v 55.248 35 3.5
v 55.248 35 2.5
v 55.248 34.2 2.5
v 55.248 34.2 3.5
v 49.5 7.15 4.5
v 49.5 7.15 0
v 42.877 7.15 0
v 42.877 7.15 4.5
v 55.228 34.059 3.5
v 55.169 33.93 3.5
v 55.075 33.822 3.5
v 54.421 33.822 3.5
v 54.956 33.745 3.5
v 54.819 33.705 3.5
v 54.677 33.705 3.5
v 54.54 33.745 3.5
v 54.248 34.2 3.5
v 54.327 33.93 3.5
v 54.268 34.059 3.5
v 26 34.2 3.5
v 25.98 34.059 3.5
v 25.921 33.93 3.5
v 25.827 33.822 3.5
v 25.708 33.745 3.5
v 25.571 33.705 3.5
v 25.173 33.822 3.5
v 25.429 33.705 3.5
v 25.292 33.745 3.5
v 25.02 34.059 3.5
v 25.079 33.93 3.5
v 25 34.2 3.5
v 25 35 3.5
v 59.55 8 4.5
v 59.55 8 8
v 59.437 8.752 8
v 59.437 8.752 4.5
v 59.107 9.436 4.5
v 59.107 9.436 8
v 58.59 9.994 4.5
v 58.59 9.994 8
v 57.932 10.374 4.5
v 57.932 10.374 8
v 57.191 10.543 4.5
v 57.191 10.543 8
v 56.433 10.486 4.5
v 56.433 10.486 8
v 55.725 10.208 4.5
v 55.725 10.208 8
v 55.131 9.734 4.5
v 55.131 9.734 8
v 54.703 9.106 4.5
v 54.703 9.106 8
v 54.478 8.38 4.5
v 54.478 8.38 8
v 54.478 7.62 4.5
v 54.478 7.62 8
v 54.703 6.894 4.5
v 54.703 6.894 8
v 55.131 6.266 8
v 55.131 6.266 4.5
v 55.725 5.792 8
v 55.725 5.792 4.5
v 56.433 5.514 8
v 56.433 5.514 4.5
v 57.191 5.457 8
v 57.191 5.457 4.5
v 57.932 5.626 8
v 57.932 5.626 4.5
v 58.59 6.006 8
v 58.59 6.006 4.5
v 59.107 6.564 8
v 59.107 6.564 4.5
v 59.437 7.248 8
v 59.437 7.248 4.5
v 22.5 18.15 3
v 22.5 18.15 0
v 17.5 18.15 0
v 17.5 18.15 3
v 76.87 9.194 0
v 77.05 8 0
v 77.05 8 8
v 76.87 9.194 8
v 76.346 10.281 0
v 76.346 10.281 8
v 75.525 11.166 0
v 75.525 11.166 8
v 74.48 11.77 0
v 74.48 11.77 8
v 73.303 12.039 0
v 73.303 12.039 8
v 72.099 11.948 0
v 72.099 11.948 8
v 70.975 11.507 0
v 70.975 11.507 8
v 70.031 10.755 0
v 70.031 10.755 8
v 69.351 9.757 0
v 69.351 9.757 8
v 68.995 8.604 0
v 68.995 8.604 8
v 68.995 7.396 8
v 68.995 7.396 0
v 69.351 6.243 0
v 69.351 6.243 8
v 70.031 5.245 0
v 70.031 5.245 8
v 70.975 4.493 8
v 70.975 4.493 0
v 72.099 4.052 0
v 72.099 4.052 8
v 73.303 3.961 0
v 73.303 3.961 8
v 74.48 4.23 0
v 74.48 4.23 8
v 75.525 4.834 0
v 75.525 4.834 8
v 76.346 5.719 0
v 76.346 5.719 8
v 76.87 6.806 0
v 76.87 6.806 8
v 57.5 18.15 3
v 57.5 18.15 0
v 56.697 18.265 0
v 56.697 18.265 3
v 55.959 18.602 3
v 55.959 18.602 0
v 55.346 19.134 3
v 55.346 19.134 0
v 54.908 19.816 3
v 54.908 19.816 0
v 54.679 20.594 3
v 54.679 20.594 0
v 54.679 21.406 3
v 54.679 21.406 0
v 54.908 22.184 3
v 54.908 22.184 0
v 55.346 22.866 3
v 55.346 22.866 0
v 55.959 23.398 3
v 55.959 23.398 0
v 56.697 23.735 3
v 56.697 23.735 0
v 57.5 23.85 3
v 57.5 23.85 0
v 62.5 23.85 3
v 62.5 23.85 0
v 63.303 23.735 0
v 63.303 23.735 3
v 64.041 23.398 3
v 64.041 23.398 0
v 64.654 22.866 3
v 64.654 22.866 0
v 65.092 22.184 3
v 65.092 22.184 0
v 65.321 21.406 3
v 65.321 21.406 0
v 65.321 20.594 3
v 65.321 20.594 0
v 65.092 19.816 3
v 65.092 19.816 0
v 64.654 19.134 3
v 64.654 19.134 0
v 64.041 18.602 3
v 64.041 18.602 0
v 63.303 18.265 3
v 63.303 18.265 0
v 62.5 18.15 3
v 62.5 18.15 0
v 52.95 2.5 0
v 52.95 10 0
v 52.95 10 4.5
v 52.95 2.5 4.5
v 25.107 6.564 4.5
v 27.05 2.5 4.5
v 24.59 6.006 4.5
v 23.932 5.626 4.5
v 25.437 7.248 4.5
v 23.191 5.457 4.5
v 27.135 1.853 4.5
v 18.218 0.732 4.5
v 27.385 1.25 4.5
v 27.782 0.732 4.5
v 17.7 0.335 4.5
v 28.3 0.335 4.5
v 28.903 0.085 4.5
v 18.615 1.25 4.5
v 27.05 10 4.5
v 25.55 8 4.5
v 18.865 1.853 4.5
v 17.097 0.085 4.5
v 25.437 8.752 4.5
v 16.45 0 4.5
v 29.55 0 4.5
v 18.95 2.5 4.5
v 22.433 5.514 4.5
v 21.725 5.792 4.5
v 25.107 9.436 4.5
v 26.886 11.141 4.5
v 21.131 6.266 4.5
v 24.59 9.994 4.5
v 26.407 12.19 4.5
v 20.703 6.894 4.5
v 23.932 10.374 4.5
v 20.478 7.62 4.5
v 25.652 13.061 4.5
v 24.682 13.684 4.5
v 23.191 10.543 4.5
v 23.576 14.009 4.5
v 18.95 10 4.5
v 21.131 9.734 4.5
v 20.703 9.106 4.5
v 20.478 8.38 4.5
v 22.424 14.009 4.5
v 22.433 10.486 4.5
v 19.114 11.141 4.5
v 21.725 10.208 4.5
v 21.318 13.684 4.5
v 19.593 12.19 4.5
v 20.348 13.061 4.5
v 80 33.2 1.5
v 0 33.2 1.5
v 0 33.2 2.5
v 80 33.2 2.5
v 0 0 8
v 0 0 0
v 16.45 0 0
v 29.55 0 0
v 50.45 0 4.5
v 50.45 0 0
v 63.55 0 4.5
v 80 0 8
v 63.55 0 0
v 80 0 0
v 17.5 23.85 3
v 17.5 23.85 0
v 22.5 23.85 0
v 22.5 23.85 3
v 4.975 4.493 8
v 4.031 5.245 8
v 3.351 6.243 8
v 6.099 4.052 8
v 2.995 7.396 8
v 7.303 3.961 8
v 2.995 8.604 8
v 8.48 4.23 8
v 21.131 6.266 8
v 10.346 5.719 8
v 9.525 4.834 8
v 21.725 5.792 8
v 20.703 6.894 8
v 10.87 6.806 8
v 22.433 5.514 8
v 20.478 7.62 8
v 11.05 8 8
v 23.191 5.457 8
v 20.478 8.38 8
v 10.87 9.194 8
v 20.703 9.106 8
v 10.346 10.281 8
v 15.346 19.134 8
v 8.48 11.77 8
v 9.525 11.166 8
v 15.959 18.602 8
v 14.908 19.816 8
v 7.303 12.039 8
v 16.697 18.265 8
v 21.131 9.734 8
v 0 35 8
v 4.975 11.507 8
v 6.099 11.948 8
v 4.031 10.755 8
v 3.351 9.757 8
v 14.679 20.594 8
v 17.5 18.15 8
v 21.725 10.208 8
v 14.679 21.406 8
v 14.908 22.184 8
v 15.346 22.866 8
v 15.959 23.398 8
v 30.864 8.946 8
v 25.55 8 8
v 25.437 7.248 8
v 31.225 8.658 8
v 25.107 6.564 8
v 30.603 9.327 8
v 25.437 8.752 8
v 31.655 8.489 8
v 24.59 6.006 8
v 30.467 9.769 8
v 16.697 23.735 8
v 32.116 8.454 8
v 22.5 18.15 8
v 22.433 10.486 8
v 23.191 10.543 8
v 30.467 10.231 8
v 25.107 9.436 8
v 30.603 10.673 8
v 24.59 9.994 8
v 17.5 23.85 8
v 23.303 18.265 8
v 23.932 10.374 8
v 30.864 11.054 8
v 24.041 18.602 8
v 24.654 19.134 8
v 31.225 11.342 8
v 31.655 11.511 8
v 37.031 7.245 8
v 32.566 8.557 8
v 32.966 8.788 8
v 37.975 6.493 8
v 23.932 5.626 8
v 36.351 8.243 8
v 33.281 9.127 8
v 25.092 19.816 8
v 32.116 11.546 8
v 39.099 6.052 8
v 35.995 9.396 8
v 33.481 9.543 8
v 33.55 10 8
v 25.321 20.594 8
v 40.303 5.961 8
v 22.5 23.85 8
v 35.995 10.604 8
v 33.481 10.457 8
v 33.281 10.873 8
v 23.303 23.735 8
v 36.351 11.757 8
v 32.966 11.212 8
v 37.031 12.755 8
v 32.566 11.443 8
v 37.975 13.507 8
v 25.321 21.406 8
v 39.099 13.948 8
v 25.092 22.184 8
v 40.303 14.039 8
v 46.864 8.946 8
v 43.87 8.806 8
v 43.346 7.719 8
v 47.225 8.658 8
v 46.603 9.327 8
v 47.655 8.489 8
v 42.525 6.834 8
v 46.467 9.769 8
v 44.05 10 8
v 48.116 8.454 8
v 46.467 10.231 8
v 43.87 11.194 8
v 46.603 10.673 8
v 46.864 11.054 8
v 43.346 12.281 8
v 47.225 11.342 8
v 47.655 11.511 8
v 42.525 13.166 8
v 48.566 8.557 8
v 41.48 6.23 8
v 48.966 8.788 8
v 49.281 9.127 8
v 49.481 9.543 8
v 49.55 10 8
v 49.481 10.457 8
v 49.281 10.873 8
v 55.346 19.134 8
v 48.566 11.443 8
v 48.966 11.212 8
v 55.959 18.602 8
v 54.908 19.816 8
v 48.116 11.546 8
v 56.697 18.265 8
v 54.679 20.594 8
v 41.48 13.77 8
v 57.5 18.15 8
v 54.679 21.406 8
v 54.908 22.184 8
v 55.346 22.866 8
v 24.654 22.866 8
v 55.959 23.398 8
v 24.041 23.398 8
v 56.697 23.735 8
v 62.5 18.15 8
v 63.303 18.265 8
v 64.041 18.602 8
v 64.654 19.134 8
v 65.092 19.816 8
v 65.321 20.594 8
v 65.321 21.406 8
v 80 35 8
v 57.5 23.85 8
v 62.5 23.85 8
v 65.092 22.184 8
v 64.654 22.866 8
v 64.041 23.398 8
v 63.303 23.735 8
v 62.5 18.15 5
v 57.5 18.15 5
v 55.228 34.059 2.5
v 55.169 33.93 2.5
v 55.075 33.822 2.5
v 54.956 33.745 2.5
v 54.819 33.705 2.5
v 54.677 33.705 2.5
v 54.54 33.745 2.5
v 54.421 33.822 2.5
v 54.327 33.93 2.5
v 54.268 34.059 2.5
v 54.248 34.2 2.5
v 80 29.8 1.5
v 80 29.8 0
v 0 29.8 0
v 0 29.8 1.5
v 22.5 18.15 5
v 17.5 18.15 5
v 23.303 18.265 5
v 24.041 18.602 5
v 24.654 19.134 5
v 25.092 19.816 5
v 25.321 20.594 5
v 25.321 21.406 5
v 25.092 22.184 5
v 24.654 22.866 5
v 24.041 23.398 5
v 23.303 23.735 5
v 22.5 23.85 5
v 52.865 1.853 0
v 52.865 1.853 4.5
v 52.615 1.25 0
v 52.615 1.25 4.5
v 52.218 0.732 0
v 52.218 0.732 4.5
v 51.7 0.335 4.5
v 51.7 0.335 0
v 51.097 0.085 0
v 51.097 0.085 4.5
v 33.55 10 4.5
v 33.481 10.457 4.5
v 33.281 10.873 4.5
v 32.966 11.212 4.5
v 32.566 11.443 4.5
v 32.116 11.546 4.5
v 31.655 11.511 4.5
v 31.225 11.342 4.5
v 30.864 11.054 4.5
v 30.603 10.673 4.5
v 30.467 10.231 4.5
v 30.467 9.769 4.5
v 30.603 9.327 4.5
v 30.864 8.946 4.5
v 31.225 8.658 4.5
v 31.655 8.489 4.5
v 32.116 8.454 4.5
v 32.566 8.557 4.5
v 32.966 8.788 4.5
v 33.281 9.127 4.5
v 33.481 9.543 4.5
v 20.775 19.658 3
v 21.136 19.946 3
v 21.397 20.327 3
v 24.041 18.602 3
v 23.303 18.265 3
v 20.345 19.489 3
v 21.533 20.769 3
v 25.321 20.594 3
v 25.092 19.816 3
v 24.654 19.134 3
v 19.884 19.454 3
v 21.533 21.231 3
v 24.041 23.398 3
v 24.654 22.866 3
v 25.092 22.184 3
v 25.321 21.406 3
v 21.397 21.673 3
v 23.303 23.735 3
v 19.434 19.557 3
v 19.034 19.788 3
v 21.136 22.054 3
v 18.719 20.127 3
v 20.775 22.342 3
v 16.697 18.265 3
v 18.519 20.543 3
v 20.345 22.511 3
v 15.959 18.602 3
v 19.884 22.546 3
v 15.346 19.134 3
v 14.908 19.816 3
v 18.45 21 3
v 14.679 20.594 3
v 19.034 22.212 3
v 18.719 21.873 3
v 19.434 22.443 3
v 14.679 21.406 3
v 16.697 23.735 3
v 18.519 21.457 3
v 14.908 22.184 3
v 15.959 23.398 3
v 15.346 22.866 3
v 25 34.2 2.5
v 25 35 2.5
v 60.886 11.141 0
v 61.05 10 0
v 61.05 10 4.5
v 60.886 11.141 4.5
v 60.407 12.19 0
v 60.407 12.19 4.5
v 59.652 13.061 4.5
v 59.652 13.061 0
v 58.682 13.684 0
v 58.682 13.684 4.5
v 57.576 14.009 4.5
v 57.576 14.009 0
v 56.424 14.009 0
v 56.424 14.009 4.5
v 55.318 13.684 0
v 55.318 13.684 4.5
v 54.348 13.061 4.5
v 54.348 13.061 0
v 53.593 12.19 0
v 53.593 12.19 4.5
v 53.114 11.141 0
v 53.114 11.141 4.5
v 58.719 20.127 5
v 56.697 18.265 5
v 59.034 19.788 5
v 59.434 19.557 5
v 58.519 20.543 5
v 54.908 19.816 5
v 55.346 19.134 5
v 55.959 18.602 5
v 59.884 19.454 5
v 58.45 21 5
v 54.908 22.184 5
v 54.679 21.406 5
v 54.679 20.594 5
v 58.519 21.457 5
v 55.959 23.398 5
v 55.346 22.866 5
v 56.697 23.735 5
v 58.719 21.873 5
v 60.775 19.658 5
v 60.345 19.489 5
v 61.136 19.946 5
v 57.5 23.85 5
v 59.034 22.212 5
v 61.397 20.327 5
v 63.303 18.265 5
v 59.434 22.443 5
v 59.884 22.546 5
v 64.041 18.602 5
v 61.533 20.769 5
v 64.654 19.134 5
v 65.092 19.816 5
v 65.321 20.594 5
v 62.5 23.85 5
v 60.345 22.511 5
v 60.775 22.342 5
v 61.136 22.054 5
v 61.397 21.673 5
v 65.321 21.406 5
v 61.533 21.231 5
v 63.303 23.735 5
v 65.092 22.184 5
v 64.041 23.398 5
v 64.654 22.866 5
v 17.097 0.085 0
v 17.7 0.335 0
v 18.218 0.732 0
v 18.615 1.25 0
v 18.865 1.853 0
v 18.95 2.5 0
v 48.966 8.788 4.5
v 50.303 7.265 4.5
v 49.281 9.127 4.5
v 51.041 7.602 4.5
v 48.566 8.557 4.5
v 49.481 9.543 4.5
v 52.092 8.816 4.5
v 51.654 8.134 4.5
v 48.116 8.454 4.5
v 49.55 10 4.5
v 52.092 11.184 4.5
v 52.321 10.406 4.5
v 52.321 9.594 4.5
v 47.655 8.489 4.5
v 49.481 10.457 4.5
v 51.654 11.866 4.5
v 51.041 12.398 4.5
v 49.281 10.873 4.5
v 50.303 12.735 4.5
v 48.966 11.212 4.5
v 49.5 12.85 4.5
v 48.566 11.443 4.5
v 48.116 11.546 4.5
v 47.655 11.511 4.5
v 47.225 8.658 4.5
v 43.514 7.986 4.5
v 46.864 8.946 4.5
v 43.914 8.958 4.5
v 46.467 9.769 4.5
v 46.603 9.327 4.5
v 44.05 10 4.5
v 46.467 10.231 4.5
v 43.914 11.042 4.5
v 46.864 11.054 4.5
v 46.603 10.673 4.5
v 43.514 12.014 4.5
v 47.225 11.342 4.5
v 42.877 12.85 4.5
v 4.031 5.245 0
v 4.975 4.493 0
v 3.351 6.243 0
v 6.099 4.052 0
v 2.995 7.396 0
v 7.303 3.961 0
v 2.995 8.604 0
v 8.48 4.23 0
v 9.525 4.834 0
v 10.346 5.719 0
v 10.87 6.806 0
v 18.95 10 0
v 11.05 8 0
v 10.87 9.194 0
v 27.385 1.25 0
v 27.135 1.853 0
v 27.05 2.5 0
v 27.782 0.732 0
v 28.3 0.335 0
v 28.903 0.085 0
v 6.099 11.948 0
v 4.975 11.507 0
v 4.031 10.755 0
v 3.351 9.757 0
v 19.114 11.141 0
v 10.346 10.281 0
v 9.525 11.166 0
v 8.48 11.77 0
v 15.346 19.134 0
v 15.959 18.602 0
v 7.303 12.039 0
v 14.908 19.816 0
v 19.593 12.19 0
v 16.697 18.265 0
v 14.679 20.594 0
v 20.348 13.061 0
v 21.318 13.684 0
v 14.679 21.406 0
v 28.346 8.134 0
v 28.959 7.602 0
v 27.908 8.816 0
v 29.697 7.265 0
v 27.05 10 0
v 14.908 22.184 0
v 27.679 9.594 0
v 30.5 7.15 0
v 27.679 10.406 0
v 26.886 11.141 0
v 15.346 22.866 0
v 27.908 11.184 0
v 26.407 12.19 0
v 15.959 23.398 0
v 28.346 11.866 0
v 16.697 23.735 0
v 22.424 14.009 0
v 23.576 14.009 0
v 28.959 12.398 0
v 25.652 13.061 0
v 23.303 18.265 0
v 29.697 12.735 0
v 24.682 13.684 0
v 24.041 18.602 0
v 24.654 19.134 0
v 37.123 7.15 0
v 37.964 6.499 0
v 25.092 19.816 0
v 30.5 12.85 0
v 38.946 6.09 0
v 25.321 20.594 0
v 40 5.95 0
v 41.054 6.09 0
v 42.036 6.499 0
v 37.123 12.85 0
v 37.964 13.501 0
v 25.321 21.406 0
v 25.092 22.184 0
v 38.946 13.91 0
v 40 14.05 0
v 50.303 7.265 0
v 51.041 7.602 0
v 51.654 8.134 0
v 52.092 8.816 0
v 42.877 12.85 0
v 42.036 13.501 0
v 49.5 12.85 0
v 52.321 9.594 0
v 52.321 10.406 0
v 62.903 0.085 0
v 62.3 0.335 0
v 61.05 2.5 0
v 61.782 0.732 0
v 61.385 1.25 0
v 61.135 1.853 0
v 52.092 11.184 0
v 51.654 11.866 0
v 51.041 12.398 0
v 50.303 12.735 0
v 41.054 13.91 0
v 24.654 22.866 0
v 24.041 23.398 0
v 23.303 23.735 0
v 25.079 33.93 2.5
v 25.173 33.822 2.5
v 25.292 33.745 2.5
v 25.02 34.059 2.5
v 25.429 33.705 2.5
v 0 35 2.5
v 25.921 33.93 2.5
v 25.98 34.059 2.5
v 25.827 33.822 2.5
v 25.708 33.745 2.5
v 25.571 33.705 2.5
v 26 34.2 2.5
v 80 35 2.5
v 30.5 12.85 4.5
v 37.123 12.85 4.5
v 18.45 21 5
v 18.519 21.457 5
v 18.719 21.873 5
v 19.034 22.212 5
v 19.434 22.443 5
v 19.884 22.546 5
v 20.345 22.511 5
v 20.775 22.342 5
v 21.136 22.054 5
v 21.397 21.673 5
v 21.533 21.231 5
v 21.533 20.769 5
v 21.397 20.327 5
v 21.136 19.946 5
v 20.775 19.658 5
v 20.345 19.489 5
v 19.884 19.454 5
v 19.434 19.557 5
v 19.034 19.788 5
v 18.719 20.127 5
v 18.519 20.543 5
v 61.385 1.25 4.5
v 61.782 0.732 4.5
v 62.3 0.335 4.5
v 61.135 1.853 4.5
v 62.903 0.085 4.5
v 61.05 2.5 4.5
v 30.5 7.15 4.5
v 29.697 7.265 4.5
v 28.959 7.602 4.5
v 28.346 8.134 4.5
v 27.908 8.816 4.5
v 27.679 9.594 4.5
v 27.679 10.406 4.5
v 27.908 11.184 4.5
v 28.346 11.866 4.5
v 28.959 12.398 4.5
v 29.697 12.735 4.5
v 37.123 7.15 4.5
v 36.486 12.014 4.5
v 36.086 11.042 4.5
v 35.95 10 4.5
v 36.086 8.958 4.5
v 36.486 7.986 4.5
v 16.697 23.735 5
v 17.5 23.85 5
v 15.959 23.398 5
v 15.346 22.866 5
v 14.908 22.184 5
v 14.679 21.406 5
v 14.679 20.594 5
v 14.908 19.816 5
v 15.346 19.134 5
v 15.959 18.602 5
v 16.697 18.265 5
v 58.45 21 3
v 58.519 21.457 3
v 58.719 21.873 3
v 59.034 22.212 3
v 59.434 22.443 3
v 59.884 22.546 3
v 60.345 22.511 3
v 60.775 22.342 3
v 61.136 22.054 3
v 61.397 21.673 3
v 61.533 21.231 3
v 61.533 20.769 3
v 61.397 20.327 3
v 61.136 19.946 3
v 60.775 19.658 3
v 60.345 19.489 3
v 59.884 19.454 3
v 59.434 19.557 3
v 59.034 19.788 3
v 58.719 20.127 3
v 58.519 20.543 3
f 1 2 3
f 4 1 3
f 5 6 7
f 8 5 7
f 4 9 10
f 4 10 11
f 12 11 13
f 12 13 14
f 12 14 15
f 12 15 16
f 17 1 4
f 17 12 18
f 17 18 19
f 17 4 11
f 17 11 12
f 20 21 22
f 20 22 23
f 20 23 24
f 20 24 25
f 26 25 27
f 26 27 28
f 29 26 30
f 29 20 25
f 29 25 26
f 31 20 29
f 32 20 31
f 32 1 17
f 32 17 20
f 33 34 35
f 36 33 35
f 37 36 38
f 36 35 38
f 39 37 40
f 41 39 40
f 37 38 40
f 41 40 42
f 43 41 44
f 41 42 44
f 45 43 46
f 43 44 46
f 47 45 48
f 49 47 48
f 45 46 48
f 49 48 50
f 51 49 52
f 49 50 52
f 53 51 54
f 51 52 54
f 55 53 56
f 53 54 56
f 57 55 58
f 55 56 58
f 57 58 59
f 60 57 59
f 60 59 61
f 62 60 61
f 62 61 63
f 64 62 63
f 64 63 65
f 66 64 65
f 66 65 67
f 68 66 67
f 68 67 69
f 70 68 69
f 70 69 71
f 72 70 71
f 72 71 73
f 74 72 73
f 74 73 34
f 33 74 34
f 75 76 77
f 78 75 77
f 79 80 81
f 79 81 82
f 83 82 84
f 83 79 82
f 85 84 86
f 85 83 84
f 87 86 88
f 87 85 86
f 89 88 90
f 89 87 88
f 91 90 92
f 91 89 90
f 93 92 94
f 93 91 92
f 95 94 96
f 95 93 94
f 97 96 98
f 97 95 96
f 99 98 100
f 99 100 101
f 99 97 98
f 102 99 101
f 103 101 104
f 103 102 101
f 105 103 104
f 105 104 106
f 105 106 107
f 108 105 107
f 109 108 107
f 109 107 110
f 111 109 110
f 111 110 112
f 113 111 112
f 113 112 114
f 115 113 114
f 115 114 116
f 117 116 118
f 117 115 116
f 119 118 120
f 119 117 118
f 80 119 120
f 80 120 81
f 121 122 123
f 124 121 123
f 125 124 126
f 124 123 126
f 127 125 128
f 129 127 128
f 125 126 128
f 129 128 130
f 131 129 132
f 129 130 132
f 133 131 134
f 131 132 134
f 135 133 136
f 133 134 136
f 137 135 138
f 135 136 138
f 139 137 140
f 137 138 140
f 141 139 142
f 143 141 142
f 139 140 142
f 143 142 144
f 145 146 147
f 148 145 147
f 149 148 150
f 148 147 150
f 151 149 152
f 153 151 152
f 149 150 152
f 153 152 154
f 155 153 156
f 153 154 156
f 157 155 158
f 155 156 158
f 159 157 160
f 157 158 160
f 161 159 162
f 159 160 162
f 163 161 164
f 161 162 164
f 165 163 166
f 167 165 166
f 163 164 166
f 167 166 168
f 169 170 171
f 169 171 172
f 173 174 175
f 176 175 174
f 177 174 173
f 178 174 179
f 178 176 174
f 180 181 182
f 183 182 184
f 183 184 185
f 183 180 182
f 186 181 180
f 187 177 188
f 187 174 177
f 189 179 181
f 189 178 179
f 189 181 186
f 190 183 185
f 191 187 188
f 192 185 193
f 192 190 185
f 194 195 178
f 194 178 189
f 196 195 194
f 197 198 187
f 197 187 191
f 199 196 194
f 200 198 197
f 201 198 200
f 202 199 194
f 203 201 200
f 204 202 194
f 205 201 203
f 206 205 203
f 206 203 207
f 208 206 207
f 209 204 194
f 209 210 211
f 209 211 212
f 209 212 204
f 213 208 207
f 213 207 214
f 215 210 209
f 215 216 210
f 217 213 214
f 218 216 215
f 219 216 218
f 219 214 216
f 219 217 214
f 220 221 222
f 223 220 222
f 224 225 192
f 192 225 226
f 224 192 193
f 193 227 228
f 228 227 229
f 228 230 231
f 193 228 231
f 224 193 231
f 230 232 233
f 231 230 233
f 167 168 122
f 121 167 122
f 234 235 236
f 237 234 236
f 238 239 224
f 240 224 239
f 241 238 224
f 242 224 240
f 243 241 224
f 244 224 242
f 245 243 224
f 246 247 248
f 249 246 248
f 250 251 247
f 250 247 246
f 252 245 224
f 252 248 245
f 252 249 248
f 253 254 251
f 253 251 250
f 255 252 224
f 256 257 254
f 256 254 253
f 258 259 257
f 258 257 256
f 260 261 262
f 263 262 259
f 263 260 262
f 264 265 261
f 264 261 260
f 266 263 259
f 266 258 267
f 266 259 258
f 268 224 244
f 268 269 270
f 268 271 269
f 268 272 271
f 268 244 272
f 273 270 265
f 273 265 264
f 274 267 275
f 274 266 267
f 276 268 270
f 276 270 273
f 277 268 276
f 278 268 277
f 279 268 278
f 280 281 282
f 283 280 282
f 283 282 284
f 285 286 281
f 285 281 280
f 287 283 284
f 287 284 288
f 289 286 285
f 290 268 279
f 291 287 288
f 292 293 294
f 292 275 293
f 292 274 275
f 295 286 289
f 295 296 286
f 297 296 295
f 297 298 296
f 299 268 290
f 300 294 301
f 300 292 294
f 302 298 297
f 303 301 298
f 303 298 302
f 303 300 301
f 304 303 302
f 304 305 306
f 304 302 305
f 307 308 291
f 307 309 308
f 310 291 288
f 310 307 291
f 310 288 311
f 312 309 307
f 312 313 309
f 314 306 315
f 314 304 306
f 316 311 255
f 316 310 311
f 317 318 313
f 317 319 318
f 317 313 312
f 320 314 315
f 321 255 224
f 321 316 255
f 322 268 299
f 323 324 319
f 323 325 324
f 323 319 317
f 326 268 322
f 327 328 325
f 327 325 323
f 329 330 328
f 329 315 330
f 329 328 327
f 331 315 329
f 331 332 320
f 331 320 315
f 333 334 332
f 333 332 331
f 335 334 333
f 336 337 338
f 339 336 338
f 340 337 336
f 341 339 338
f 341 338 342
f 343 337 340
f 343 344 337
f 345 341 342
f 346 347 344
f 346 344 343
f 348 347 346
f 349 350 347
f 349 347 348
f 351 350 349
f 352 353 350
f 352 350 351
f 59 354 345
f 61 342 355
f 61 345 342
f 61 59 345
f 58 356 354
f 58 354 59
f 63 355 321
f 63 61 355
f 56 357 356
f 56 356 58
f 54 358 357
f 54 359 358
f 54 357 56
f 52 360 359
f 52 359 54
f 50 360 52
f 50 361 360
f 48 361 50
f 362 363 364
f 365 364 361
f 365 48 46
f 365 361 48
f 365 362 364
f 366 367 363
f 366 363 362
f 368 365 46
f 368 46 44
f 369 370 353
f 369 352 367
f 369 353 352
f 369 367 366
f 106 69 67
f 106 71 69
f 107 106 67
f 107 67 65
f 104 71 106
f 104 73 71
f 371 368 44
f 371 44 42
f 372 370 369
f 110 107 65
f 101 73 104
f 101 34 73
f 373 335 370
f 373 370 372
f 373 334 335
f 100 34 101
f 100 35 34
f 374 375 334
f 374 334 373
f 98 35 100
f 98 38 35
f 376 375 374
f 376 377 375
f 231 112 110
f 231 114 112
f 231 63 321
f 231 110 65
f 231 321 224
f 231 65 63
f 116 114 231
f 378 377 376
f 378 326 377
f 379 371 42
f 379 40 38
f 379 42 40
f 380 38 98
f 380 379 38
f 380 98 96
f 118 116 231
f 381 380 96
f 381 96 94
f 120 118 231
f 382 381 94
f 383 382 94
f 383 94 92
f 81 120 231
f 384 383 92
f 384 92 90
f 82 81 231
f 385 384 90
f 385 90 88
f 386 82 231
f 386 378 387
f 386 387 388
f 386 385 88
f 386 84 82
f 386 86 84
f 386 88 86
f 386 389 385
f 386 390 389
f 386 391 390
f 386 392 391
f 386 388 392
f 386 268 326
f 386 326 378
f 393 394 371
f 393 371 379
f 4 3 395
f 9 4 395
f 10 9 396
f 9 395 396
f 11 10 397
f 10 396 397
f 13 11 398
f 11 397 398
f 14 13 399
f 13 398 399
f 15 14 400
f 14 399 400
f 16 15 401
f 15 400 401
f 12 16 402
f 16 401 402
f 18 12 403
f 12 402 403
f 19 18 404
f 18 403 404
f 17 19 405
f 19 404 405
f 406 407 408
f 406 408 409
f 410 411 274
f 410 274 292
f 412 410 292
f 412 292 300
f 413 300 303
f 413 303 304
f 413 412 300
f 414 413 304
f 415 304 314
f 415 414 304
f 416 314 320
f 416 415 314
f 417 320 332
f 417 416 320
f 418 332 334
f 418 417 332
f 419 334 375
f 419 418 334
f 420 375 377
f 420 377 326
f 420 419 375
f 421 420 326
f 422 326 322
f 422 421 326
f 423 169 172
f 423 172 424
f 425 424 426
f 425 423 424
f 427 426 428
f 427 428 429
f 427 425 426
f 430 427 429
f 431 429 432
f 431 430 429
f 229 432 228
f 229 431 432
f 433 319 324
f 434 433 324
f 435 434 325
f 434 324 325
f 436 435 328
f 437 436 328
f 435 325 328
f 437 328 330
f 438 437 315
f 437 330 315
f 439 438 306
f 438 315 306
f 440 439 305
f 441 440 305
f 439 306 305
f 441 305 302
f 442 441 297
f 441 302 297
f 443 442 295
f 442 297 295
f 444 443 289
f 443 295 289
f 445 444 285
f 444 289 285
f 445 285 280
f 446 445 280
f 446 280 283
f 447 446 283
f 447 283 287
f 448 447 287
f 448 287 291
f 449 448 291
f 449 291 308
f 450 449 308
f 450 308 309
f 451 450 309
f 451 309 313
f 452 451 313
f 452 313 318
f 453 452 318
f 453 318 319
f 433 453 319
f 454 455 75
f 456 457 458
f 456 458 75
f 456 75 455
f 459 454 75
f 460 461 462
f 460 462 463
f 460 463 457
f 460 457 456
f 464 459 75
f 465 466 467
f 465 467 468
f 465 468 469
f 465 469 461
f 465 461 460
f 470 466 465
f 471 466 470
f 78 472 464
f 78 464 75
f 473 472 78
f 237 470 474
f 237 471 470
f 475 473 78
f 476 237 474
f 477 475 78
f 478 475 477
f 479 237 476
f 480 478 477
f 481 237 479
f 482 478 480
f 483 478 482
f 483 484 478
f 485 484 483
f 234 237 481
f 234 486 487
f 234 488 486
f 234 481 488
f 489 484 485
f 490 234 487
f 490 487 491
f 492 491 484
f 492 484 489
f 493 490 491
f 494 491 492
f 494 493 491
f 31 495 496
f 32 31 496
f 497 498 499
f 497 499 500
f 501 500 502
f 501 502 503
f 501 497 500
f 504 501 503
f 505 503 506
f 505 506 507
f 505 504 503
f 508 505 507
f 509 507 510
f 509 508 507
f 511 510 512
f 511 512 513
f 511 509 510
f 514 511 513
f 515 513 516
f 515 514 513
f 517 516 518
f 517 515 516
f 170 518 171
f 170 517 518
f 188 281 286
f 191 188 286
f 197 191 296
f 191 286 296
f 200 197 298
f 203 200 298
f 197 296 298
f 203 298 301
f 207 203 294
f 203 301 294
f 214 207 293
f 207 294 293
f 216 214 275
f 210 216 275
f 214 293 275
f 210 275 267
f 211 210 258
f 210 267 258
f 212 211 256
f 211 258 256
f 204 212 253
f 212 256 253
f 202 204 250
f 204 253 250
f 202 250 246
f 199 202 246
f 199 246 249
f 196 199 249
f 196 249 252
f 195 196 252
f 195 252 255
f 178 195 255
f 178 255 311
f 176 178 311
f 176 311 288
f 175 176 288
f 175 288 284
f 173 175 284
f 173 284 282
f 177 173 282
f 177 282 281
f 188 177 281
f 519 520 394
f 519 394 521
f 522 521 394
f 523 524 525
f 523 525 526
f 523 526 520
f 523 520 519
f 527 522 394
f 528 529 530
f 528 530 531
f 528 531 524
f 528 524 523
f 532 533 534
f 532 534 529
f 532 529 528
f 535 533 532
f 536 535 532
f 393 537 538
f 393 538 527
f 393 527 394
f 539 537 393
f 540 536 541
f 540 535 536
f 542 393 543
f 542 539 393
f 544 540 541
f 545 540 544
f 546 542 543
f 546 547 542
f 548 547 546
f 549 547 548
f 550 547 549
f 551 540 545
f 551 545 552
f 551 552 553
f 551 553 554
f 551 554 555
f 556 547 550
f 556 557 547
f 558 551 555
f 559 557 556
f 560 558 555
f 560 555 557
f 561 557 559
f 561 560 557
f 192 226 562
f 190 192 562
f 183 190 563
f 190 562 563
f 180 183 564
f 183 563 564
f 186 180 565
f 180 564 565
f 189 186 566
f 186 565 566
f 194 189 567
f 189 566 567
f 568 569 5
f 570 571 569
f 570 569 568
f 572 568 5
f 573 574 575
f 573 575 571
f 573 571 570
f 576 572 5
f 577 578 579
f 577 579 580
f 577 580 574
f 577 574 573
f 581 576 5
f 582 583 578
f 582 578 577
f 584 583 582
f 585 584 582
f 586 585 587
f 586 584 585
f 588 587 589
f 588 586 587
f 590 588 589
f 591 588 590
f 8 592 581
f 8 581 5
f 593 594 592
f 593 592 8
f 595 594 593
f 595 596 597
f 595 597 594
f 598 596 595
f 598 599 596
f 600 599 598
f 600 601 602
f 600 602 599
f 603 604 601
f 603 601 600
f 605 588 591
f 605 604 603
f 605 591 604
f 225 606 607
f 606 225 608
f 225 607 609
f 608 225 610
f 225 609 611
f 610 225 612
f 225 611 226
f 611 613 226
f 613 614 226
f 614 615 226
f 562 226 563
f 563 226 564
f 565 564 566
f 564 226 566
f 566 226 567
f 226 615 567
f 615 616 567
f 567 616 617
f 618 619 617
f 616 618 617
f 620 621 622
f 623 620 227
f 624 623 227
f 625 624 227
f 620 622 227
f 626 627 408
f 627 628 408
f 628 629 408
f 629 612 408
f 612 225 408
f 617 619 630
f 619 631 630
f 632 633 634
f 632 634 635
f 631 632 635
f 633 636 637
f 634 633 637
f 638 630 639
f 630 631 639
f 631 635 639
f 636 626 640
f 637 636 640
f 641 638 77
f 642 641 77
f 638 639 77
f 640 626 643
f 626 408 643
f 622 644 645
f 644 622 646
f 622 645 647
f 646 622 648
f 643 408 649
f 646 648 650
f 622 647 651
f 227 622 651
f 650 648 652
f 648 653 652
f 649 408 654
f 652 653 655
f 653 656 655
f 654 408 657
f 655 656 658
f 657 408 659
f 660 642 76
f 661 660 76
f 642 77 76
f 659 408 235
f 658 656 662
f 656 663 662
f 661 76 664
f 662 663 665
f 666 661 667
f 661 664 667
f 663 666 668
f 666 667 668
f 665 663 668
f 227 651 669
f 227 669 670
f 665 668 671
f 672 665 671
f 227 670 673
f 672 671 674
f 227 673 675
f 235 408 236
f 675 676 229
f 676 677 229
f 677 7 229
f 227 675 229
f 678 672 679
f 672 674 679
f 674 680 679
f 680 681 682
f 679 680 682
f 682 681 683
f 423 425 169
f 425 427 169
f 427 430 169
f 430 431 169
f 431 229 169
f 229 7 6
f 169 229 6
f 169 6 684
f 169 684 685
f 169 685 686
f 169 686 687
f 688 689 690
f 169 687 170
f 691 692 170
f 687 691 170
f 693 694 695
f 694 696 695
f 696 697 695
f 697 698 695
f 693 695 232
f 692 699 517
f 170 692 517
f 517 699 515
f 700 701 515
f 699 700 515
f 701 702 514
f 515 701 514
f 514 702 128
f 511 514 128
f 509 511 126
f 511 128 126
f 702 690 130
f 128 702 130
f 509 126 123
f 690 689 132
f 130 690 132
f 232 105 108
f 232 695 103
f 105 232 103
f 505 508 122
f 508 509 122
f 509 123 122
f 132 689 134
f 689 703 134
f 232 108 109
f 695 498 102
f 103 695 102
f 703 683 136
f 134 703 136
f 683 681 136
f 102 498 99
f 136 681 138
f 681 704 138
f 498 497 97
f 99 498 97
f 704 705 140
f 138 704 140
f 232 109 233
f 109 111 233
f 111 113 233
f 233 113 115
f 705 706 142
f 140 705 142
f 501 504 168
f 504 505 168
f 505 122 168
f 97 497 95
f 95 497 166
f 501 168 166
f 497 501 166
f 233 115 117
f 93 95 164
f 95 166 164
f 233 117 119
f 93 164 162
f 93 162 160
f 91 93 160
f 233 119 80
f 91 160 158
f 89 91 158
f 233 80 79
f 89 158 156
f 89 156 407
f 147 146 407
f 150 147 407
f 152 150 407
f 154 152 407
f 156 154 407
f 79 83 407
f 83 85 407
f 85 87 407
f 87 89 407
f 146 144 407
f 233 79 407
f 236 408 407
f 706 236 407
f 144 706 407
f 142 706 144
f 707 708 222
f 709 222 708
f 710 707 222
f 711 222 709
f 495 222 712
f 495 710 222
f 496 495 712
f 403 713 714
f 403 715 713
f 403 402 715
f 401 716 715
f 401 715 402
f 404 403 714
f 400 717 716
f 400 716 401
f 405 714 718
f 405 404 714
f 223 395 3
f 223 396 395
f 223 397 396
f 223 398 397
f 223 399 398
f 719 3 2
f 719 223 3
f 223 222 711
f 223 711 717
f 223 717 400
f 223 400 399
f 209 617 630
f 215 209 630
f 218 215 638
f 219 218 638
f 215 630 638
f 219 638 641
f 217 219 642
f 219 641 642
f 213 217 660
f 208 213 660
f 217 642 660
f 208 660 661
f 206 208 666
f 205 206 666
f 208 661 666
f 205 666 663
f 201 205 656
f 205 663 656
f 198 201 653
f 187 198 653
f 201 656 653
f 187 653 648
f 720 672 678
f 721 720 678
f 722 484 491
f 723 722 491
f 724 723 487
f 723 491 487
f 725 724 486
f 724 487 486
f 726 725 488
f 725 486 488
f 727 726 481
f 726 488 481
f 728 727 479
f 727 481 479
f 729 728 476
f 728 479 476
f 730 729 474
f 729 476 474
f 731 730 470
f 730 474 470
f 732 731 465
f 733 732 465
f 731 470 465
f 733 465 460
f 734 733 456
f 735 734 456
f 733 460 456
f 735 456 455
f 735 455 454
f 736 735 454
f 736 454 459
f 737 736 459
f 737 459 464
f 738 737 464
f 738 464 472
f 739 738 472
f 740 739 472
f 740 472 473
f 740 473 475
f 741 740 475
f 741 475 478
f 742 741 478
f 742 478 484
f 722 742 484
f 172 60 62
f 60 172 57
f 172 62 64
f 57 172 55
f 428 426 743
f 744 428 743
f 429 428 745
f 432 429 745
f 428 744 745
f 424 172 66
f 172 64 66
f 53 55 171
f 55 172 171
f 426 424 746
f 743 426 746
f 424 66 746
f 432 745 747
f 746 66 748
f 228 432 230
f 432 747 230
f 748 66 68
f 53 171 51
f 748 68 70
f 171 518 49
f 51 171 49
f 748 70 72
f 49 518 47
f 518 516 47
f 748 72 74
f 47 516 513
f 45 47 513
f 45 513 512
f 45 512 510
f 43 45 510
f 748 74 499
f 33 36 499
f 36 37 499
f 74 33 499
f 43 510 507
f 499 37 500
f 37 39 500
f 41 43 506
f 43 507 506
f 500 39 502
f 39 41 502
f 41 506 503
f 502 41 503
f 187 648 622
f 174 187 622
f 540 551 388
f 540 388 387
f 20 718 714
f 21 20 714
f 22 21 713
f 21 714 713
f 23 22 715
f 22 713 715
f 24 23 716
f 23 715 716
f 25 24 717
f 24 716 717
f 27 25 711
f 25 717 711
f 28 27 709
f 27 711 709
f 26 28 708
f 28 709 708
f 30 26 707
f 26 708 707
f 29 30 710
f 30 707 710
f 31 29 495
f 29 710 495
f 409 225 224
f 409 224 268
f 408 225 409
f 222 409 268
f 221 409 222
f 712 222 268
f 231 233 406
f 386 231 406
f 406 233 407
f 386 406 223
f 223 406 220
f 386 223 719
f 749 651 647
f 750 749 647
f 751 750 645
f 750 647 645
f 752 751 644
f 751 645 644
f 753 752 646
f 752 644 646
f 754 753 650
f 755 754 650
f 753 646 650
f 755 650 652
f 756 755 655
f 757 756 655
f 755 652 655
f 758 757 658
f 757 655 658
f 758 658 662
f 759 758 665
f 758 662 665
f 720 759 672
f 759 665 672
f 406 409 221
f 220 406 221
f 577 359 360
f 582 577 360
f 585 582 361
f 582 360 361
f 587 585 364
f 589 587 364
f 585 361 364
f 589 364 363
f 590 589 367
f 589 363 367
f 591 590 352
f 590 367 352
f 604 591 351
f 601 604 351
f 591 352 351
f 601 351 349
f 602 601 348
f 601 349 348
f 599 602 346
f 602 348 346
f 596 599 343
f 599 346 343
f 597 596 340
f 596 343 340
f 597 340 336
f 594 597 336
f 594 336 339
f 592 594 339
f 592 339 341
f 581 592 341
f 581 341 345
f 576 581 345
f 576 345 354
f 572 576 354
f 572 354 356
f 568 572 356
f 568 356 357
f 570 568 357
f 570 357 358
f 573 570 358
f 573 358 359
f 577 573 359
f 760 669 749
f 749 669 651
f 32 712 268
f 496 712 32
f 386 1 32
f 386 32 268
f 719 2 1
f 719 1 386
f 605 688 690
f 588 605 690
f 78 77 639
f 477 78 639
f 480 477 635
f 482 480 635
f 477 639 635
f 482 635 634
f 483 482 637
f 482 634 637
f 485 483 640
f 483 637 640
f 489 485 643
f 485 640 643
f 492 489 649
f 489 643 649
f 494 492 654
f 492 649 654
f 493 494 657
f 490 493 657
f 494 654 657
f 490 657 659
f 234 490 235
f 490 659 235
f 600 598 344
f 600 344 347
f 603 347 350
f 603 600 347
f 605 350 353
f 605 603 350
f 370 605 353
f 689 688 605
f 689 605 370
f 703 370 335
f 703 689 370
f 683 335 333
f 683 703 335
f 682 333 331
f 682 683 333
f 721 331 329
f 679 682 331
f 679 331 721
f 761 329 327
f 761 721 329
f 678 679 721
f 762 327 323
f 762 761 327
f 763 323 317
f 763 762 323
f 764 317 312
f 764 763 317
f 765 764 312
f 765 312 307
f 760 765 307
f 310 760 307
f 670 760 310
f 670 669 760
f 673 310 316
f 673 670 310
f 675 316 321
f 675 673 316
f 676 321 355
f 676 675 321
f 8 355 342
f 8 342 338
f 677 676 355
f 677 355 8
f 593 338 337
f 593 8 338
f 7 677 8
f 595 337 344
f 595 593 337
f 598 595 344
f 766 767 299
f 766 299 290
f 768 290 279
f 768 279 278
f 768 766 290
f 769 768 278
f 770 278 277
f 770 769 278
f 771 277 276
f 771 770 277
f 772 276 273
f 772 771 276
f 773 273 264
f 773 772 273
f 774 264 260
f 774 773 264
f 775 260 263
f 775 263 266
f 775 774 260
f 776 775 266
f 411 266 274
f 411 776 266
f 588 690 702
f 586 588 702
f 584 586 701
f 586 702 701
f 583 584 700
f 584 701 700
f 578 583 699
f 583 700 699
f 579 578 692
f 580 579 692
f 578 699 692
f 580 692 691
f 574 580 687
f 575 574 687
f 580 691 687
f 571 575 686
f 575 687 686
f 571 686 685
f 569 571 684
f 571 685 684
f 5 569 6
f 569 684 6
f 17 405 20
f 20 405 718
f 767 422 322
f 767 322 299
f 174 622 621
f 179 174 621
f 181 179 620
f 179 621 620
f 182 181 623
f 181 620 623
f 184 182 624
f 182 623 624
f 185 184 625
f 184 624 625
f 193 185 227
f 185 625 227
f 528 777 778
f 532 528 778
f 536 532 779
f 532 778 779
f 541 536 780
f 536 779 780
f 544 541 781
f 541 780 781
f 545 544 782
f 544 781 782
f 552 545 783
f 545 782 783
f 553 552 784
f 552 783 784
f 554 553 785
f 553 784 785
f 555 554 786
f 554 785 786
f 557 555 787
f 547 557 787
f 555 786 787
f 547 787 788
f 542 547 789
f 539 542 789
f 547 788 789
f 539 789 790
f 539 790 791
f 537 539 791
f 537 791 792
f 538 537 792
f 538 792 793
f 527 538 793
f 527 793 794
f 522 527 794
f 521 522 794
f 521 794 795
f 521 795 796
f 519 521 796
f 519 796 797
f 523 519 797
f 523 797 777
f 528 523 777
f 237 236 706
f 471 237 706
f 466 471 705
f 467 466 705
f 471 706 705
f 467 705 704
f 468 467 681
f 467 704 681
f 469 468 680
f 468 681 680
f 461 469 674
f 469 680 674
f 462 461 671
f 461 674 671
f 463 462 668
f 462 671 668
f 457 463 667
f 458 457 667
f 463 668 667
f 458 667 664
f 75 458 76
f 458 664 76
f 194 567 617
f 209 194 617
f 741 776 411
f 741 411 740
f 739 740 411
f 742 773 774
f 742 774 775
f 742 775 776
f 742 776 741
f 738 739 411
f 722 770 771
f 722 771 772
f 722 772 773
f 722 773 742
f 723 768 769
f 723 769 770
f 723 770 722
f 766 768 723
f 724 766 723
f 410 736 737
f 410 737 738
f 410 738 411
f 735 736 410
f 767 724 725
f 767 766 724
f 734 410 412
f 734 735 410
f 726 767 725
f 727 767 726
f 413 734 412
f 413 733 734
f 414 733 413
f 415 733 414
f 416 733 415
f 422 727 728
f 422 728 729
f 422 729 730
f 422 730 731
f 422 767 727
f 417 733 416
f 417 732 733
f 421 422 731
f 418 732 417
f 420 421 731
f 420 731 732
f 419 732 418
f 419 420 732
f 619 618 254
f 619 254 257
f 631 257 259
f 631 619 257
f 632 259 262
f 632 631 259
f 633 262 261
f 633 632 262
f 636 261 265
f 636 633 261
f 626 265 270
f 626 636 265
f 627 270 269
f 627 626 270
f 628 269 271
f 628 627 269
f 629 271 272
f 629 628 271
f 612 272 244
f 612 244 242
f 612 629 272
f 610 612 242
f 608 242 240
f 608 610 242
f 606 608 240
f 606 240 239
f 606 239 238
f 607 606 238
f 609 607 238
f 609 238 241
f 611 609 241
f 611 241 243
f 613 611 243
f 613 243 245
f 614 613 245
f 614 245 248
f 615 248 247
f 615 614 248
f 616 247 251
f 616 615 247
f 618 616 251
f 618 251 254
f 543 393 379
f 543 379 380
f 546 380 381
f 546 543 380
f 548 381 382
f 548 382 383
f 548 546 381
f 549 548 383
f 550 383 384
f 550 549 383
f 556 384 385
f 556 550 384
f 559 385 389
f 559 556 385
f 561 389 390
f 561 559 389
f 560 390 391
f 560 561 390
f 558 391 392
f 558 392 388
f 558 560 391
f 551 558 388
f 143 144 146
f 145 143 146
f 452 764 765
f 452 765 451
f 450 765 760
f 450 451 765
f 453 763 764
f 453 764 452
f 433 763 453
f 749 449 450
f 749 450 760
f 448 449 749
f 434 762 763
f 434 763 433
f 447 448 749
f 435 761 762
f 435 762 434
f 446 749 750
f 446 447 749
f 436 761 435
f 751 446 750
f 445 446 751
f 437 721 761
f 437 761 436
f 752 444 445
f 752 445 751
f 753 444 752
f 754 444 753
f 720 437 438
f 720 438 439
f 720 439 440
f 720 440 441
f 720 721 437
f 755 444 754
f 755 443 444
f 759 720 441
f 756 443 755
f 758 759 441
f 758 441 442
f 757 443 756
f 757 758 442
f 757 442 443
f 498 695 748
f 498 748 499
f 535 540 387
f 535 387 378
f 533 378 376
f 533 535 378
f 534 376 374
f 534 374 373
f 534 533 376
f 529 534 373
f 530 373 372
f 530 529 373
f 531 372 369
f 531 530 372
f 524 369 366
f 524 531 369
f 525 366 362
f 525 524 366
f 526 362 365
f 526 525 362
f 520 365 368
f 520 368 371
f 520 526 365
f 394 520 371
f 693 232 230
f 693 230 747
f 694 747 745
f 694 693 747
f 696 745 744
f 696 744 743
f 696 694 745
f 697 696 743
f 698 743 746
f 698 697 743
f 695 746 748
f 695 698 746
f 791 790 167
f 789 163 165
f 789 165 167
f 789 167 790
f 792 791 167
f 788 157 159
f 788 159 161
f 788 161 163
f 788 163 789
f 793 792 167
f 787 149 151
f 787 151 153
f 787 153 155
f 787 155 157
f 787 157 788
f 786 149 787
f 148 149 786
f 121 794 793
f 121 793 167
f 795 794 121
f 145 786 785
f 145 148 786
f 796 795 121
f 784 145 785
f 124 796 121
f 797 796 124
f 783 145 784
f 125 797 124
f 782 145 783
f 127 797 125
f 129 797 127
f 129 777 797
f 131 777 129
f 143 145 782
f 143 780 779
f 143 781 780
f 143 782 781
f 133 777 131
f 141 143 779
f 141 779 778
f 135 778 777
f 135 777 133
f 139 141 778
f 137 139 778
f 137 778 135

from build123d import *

# Parameters (mm, degrees)
SKETCH_2_W           = 80
SKETCH_2_H           = 35
SKETCH_2_R           = 4.05
EXTRUDE_1_DEPTH      = 8
SKETCH_3_R           = 2.55
CUT_EXTRUDE_1_DEPTH  = 88.686943156
CUT_EXTRUDE_2_DEPTH  = 88.686943156
SKETCH_5_R           = 1.55
CUT_EXTRUDE_3_DEPTH  = 88.686943156
CUT_EXTRUDE_4_DEPTH  = 4.5
CUT_EXTRUDE_5_DEPTH  = 4.5
SKETCH_11_R          = 1.55
CUT_EXTRUDE_7_DEPTH  = 88.686943156
CUT_EXTRUDE_8_DEPTH  = 3
CUT_EXTRUDE_START    = -3
CUT_EXTRUDE_9_DEPTH  = 3
CUT_EXTRUDE_11_DEPTH = 1


with BuildPart() as part:
    # 草图2 → 凸台-拉伸1 (new body)
    with BuildSketch(Plane.XY):
        with Locations((40, 17.5)):
            Rectangle(SKETCH_2_W, SKETCH_2_H)
        with Locations((7, 8)):
            Circle(SKETCH_2_R, mode=Mode.SUBTRACT)
        with Locations((40, 10)):
            Circle(SKETCH_2_R, mode=Mode.SUBTRACT)
        with Locations((73, 8)):
            Circle(SKETCH_2_R, mode=Mode.SUBTRACT)
    extrude(amount=EXTRUDE_1_DEPTH)

    # 草图3 → 切除-拉伸1 (cut, through all)
    with BuildSketch(Plane.XY.offset(8)):
        with Locations((23, 8)):
            Circle(SKETCH_3_R)
        with Locations((57, 8)):
            Circle(SKETCH_3_R)
    extrude(amount=-CUT_EXTRUDE_1_DEPTH, mode=Mode.SUBTRACT)

    # 草图4 → 切除-拉伸2 (cut, through all)
    with BuildSketch(Plane(origin=(80, 0, 0), x_dir=(0, 0, -1), z_dir=(1, 0, 0))):
        Polygon((-1.5, 33.2), (-2.5, 33.2), (-2.5, 35), (0, 35), (0, 29.8), (-1.5, 29.8), align=None)
    extrude(amount=-CUT_EXTRUDE_2_DEPTH, mode=Mode.SUBTRACT)

    # 草图5 → 切除-拉伸3 (cut, through all)
    with BuildSketch(Plane.XY.offset(8)):
        with Locations((48, 10)):
            Circle(SKETCH_5_R)
        with Locations((32, 10)):
            Circle(SKETCH_5_R)
    extrude(amount=-CUT_EXTRUDE_3_DEPTH, mode=Mode.SUBTRACT)

    # 草图7 → 切除-拉伸4 (cut)
    with BuildSketch(Plane(origin=(0, 0, 0), x_dir=(-1, 0, 0), z_dir=(0, 0, -1))):
        with BuildLine():
            Line((-27.05, 10), (-27.05, 2.5))
            ThreePointArc((-27.05, 2.5), (-27.782233047, 0.732233047), (-29.55, 0))
            Line((-29.55, 0), (-16.45, 0))
            ThreePointArc((-16.45, 0), (-18.217766953, 0.732233047), (-18.95, 2.5))
            Line((-18.95, 2.5), (-18.95, 10))
            ThreePointArc((-18.95, 10), (-23, 14.05), (-27.05, 10))
        make_face()
        with BuildLine():
            Line((-61.05, 2.5), (-61.05, 10))
            ThreePointArc((-61.05, 10), (-57, 14.05), (-52.95, 10))
            Line((-52.95, 10), (-52.95, 2.5))
            ThreePointArc((-52.95, 2.5), (-52.217766953, 0.732233047), (-50.45, 0))
            Line((-50.45, 0), (-63.55, 0))
            ThreePointArc((-63.55, 0), (-61.782233047, 0.732233047), (-61.05, 2.5))
        make_face()
    extrude(amount=-CUT_EXTRUDE_4_DEPTH, mode=Mode.SUBTRACT)

    # 草图8 → 切除-拉伸5 (cut)
    with BuildSketch(Plane(origin=(0, 0, 0), x_dir=(-1, 0, 0), z_dir=(0, 0, -1))):
        with BuildLine():
            Line((-30.5, 12.85), (-49.5, 12.85))
            ThreePointArc((-49.5, 12.85), (-52.35, 10), (-49.5, 7.15))
            Line((-49.5, 7.15), (-30.5, 7.15))
            ThreePointArc((-30.5, 7.15), (-27.65, 10), (-30.5, 12.85))
        make_face()
    extrude(amount=-CUT_EXTRUDE_5_DEPTH, mode=Mode.SUBTRACT)

    # 草图11 → 切除-拉伸7 (cut, through all)
    with BuildSketch(Plane(origin=(0, 0, 0), x_dir=(-1, 0, 0), z_dir=(0, 0, -1))):
        with Locations((-60, 21)):
            Circle(SKETCH_11_R)
        with Locations((-20, 21)):
            Circle(SKETCH_11_R)
    extrude(amount=-CUT_EXTRUDE_7_DEPTH, mode=Mode.SUBTRACT)

    # 草图12 → 切除-拉伸8 (cut)
    with BuildSketch(Plane(origin=(0, 0, 0), x_dir=(-1, 0, 0), z_dir=(0, 0, -1))):
        with BuildLine():
            Line((-62.5, 18.15), (-57.5, 18.15))
            ThreePointArc((-57.5, 18.15), (-54.65, 21), (-57.5, 23.85))
            Line((-57.5, 23.85), (-62.5, 23.85))
            ThreePointArc((-62.5, 23.85), (-65.35, 21), (-62.5, 18.15))
        make_face()
        with BuildLine():
            Line((-17.5, 23.85), (-22.5, 23.85))
            ThreePointArc((-22.5, 23.85), (-25.35, 21), (-22.5, 18.15))
            Line((-22.5, 18.15), (-17.5, 18.15))
            ThreePointArc((-17.5, 18.15), (-14.65, 21), (-17.5, 23.85))
        make_face()
    extrude(amount=-CUT_EXTRUDE_8_DEPTH, mode=Mode.SUBTRACT)

    # 草图15 → 切除-拉伸9 (cut)
    with BuildSketch(Plane.XY.offset(8).offset(CUT_EXTRUDE_START)):
        with BuildLine():
            Line((57.5, 18.15), (62.5, 18.15))
            ThreePointArc((62.5, 18.15), (65.35, 21), (62.5, 23.85))
            Line((62.5, 23.85), (57.5, 23.85))
            ThreePointArc((57.5, 23.85), (54.65, 21), (57.5, 18.15))
        make_face()
        with BuildLine():
            Line((22.5, 23.85), (17.5, 23.85))
            ThreePointArc((17.5, 23.85), (14.65, 21), (17.5, 18.15))
            Line((17.5, 18.15), (22.5, 18.15))
            ThreePointArc((22.5, 18.15), (25.35, 21), (22.5, 23.85))
        make_face()
    extrude(amount=CUT_EXTRUDE_9_DEPTH, mode=Mode.SUBTRACT)

    # 草图19 → 切除-拉伸11 (cut, symmetric)
    with BuildSketch(Plane(origin=(0, 0, 2.5), x_dir=(-1, 0, 0), z_dir=(0, 0, -1))):
        with BuildLine():
            Line((-25, 35), (-55.247938178, 35))
            Line((-55.247938178, 35), (-55.247938178, 34.2))
            ThreePointArc((-55.247938178, 34.2), (-54.747938178, 33.7), (-54.247938178, 34.2))
            Line((-54.247938178, 34.2), (-26, 34.2))
            ThreePointArc((-26, 34.2), (-25.5, 33.7), (-25, 34.2))
            Line((-25, 34.2), (-25, 35))
        make_face()
    extrude(amount=CUT_EXTRUDE_11_DEPTH, both=True, mode=Mode.SUBTRACT)


solid = part.part
